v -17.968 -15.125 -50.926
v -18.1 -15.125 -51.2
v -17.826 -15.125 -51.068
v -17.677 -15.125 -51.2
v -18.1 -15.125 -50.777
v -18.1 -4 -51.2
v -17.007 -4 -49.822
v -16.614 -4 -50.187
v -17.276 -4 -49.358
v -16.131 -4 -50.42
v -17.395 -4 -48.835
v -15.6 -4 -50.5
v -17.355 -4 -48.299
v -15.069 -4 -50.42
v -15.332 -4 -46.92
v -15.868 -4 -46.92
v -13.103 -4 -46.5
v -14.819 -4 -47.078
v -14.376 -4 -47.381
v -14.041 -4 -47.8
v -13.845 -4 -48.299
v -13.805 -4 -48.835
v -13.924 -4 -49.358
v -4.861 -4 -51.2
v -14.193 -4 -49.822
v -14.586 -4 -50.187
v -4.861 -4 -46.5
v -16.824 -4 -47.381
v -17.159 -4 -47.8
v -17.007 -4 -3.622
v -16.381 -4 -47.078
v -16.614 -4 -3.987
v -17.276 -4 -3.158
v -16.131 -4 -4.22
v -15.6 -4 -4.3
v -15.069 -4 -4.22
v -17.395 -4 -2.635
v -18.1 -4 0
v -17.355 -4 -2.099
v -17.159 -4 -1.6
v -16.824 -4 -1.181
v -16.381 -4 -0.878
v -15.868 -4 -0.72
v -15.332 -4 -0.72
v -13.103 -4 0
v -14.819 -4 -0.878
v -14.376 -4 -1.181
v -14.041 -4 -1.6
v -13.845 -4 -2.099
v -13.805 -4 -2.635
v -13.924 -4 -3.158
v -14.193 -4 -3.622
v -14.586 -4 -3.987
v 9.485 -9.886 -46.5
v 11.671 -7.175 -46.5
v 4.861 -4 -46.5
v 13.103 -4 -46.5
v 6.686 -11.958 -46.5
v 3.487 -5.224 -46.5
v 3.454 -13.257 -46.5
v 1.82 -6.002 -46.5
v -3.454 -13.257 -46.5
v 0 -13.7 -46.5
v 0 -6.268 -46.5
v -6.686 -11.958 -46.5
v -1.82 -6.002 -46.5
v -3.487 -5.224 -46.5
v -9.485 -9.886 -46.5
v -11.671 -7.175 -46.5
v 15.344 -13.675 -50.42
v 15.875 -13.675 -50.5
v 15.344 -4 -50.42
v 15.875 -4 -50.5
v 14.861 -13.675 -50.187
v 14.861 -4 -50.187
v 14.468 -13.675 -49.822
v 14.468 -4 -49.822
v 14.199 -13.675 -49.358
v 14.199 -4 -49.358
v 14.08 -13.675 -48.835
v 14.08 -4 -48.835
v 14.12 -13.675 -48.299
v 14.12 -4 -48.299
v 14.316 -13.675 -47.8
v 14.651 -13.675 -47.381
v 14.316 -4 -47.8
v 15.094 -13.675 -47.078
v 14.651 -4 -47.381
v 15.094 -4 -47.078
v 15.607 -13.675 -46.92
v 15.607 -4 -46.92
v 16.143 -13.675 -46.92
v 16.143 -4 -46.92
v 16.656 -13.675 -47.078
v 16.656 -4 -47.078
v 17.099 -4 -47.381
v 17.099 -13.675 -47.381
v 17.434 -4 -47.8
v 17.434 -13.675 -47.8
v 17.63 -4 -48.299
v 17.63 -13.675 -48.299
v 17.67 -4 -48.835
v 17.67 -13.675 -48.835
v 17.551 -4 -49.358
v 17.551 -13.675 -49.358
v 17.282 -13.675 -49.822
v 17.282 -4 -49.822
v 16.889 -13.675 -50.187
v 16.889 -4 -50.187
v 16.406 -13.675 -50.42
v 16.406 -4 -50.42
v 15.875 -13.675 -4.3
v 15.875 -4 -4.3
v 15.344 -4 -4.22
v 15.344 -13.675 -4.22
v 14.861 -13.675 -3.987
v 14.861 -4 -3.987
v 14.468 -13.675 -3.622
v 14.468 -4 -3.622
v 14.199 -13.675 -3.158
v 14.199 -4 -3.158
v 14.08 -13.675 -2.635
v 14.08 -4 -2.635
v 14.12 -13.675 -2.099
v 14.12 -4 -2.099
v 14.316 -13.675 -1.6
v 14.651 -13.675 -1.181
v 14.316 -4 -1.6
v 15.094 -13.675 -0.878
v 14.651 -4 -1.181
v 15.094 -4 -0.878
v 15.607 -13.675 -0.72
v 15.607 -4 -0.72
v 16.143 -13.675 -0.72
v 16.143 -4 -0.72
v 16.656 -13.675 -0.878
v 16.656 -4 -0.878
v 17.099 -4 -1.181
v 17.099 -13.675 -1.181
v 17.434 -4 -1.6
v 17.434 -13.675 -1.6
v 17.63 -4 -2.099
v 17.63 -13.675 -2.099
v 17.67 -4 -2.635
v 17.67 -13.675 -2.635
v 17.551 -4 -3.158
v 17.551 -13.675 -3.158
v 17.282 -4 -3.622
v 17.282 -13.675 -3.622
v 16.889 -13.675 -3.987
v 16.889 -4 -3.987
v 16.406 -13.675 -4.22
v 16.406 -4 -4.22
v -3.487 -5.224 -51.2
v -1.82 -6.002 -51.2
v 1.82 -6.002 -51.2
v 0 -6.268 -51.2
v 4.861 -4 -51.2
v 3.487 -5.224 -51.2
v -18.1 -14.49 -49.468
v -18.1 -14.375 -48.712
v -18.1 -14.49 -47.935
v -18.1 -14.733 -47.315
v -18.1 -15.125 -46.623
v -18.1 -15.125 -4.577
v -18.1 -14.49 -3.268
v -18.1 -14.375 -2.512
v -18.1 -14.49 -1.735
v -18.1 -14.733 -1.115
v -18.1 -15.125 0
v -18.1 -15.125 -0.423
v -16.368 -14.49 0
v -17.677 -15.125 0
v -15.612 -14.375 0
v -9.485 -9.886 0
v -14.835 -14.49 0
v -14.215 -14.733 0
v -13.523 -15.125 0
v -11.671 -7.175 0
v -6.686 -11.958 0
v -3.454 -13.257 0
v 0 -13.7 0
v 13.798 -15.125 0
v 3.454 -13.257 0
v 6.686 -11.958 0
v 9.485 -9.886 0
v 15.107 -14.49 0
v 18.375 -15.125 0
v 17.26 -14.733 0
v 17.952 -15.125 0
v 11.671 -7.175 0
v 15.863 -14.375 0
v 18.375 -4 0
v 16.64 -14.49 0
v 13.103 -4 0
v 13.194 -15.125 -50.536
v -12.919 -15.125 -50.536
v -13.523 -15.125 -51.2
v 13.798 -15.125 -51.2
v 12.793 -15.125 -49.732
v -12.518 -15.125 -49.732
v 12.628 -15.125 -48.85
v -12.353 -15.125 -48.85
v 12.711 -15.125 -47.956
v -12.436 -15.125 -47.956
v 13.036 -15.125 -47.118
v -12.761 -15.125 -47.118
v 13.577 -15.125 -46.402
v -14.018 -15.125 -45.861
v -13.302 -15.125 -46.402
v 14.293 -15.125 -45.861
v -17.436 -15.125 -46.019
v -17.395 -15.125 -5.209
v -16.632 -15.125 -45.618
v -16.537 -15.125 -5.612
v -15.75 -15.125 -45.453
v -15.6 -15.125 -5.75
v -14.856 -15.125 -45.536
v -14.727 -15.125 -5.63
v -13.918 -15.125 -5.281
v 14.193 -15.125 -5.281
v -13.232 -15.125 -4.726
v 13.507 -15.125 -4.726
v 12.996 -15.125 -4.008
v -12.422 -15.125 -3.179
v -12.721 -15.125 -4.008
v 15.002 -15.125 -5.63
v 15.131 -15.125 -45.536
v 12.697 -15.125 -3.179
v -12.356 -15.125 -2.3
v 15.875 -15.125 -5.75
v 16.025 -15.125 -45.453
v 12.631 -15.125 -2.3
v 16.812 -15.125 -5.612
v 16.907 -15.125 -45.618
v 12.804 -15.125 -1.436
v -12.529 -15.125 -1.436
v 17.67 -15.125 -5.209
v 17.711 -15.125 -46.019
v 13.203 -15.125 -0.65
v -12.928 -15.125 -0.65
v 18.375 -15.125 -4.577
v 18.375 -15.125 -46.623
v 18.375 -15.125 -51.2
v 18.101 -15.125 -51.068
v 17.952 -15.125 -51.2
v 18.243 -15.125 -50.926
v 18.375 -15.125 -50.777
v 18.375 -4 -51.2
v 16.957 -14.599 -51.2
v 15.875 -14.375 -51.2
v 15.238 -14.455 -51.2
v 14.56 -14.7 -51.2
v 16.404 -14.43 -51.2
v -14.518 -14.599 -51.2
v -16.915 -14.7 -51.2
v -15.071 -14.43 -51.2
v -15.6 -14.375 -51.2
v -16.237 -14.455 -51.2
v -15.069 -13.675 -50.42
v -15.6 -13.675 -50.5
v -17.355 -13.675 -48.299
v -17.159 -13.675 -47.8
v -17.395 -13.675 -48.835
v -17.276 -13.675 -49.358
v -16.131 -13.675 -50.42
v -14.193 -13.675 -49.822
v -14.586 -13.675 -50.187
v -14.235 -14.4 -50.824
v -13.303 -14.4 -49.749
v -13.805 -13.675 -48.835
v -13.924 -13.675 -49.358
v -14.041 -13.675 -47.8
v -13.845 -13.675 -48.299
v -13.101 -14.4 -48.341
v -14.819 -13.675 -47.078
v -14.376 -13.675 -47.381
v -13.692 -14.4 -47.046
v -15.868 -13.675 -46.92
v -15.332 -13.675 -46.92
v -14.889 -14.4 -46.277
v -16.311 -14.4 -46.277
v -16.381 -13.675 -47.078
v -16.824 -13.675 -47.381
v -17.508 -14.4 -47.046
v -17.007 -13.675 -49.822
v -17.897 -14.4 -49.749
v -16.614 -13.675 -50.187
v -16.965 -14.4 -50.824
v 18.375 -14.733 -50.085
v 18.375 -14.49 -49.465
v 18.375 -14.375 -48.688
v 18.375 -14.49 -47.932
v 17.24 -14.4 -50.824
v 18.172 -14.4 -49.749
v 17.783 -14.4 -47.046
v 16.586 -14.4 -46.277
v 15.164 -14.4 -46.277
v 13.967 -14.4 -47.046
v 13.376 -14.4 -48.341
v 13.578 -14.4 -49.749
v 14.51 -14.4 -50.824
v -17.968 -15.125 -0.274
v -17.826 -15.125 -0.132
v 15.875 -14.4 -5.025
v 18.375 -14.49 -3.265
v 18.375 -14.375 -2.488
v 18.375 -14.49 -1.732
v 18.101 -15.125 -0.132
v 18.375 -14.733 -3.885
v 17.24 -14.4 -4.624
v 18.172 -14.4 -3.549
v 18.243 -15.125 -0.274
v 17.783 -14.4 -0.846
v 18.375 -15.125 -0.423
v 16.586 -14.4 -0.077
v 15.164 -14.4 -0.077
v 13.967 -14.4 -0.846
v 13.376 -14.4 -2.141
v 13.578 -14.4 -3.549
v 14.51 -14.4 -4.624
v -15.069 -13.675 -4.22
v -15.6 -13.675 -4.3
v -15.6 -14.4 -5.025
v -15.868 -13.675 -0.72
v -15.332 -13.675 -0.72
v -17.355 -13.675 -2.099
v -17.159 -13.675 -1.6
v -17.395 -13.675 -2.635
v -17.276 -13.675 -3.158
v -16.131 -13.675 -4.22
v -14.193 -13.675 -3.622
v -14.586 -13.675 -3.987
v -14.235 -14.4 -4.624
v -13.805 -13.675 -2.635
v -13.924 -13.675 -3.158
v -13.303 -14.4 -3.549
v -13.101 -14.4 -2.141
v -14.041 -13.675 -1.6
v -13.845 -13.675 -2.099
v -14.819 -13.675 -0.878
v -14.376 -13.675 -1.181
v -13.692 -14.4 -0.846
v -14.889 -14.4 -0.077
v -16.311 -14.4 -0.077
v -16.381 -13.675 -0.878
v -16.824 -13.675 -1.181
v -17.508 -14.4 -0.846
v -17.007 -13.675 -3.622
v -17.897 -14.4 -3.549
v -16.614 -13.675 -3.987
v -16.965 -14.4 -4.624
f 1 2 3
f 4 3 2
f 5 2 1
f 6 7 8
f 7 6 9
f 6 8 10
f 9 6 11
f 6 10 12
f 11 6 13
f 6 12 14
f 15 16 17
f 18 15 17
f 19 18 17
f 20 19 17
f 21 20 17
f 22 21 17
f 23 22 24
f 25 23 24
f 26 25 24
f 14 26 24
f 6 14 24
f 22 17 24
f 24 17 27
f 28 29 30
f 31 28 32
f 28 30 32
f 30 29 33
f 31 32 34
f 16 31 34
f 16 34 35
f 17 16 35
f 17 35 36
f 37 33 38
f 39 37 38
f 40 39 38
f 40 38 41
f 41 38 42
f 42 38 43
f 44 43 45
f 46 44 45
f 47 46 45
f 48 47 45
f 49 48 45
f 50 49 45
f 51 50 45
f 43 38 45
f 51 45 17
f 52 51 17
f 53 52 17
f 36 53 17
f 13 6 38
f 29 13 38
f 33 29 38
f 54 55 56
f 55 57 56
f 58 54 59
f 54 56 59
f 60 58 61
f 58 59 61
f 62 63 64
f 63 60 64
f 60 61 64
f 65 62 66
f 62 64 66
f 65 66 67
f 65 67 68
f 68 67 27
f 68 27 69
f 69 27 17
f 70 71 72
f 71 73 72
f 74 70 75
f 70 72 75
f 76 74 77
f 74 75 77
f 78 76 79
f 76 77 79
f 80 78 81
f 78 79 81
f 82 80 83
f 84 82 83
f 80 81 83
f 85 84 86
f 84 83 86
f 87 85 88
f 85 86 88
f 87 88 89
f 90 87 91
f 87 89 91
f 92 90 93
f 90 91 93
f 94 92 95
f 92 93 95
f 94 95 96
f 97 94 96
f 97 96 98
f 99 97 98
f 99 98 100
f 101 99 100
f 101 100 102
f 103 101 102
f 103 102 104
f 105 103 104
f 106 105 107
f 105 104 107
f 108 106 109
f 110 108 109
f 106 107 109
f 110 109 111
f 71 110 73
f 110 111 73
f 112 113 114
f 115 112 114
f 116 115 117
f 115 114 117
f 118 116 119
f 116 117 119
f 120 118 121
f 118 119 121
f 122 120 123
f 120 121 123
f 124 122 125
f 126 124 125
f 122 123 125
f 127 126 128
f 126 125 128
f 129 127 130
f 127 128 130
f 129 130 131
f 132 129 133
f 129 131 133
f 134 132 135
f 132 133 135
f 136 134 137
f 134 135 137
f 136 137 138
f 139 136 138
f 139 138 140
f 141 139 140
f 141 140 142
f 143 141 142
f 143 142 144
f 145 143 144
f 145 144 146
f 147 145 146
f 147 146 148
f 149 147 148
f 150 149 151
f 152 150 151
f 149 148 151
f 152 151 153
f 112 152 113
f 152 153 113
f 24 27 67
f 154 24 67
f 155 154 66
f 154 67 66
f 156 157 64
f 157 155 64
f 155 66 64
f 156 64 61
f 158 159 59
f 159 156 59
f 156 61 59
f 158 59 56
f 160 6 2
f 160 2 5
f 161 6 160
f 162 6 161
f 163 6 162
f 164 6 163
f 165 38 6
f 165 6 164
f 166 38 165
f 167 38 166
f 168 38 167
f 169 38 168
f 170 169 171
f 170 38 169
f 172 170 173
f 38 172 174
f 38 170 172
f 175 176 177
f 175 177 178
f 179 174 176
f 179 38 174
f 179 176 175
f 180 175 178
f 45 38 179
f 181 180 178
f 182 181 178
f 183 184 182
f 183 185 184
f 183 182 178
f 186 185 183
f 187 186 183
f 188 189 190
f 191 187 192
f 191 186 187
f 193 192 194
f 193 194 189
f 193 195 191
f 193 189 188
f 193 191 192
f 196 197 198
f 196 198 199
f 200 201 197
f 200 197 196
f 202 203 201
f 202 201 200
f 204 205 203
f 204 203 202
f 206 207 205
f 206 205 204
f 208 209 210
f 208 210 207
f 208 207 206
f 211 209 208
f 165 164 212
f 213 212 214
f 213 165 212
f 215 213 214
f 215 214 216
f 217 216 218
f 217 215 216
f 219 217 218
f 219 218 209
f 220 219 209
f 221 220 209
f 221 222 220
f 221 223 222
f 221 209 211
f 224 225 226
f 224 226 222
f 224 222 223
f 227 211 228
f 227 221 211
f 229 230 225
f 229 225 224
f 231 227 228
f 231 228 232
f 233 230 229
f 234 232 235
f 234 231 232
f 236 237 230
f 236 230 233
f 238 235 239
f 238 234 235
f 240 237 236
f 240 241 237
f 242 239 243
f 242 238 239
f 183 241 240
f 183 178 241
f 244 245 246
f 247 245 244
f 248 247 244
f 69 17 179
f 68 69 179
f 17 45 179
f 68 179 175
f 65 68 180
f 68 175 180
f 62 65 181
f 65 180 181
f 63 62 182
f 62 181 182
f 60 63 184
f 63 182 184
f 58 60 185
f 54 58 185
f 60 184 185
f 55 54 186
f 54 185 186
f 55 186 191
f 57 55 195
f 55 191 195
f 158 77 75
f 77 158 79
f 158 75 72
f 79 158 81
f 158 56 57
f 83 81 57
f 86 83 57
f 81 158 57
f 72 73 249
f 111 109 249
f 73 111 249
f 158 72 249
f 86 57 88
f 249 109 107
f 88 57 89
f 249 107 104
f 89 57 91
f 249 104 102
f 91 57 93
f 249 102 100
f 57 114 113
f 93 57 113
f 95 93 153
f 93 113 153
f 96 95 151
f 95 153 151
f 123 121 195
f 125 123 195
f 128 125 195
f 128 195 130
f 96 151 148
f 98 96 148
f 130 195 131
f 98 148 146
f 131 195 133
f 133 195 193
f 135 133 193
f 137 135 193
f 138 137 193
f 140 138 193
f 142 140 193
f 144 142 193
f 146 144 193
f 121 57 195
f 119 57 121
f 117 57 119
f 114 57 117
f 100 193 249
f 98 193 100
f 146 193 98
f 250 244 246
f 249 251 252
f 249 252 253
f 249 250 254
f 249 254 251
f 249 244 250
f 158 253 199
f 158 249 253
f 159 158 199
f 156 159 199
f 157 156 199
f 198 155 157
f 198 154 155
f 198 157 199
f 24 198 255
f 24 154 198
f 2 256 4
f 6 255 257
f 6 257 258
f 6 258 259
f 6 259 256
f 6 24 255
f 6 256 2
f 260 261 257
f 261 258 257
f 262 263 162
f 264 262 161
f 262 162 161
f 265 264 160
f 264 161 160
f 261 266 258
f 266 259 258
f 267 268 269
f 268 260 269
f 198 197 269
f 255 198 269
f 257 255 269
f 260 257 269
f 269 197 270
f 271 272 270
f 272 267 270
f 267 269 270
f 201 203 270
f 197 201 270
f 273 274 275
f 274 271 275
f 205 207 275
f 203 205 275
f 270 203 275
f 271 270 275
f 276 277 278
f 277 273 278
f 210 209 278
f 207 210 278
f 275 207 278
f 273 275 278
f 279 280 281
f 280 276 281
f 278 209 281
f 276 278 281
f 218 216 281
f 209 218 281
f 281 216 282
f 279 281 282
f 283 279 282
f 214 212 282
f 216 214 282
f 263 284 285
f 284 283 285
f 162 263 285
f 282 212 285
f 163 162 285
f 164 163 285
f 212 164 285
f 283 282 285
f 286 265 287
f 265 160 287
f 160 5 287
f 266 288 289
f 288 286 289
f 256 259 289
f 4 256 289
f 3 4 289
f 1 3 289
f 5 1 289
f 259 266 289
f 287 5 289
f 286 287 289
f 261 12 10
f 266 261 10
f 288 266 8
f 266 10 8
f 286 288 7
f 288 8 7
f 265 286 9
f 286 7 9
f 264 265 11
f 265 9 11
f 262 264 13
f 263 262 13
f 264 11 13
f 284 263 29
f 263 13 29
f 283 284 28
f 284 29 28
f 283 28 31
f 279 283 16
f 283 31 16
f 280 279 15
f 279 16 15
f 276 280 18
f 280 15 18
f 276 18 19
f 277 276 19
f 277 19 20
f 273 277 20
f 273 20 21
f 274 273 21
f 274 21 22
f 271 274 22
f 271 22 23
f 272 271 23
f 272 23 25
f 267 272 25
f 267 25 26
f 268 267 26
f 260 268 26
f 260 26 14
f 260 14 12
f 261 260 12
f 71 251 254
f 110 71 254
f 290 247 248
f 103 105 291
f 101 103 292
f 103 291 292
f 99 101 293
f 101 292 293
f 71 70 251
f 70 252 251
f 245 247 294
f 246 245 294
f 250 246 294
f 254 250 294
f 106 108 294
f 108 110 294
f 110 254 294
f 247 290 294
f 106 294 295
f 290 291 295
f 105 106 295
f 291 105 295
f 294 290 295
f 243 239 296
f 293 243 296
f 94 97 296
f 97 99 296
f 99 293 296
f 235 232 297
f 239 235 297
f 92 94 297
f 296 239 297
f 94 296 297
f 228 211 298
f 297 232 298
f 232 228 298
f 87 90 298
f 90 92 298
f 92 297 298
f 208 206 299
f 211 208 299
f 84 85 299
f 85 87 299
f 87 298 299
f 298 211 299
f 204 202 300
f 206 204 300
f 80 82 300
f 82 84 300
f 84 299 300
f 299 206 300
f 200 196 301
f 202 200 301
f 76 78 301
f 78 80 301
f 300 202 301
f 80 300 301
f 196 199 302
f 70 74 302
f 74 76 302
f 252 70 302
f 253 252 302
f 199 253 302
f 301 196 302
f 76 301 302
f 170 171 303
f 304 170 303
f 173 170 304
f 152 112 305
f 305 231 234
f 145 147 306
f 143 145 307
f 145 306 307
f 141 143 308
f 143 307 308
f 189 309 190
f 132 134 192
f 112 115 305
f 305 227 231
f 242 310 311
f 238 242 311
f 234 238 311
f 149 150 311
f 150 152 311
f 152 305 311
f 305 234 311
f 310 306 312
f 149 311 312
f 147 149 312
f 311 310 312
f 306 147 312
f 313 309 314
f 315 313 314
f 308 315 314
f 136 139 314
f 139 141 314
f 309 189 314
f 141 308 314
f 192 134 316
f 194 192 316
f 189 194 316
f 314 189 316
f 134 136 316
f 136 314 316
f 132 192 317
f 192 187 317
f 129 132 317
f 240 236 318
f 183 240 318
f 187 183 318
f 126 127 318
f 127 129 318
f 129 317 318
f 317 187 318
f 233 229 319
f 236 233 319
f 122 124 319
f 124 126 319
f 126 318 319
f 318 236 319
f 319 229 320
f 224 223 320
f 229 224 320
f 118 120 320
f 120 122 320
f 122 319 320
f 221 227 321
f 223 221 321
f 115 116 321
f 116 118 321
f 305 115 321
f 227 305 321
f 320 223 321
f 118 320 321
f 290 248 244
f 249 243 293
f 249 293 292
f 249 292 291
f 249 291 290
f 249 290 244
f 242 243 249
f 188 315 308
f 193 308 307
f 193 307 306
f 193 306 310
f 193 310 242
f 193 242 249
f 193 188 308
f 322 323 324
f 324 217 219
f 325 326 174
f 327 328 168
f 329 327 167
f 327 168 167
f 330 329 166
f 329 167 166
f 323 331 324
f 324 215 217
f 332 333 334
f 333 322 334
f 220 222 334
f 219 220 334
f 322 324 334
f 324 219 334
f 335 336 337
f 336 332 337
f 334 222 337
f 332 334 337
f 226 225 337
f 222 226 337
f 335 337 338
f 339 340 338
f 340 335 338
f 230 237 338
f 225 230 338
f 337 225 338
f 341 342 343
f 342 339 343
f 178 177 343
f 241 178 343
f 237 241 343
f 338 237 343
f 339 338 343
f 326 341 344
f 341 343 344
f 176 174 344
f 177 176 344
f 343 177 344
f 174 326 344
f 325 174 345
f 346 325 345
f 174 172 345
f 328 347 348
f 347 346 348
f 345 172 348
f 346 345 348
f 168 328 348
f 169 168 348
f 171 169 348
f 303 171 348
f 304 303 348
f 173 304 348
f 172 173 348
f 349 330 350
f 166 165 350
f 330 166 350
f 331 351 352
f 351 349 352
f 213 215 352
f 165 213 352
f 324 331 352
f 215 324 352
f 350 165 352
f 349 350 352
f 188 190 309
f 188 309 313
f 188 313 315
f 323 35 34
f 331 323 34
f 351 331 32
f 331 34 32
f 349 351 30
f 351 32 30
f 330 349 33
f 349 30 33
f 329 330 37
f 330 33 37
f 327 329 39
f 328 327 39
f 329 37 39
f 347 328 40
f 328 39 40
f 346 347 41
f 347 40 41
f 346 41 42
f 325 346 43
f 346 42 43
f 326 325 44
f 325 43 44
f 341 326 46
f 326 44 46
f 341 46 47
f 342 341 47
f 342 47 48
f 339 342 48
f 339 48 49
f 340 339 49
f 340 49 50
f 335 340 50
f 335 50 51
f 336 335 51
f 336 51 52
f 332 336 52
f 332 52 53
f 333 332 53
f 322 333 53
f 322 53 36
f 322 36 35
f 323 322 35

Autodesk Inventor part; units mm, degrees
ref_plane "YZ Plane" through (0, 0, 0) normal (1, 0, 0) x (0, 1, 0)
sketch "Sketch1" plane through (0, 0, 0) normal (0, 0, 1) x (1, 0, 0)
  circle A0 centre (0, 0) radius 13.7 projected
  line L0 (18.375, 15.375) -> (-18.1, 15.375) projected
  line L1 (-18.1, 15.375) -> (-18.1, -4) projected
  line L2 (-18.1, -4) -> (-13.1031, -4) projected
  arc A1 (13.1031, -4) -> (-13.1031, -4) centre (0, 0) ccw projected
  line L3 (13.1031, -4) -> (18.375, -4) projected
  line L4 (18.375, -4) -> (18.375, 15.375) projected
  line L5 (18.375, -4) -> (-18.1, -4)
  line L6 (-18.1, -4) -> (-18.1, -15.125)
  line L7 (-18.1, -15.125) -> (18.375, -15.125)
  line L8 (18.375, -15.125) -> (18.375, -4)
  circle A2 centre (44.375, 8.875) radius 25 projected
  point P0 (0, -13.7)
  point P1 (44.375, -16.125)
  dimension "d2" = 29.075
  dimension "d15" = 1
ref_plane "Work Plane1" through (-13.7, -13.7, -46.5) normal (0, 0, -1) x (0, 1, 0)
extrude "Extrusion1" add sketch "Sketch1" against normal up to surface (46.5 mm away) contours A0 L3 L8 L7 L6 L2
sketch "Sketch2" plane through (18.375, -15.125, -46.5) normal (0, 0, -1) x (-1, 0, 0)
  circle A0 centre (26.375, 15.2) radius 1.0564 projected
  circle A1 centre (10.375, 15.2) radius 1.0564 projected
  circle A2 centre (18.375, 15.2) radius 5 projected
  circle A3 centre (18.375, 15.2) radius 13.7 projected
  arc A4 (23.2981, 11.2) -> (13.4519, 11.2) centre (18.375, 15.2) ccw projected
  circle A5 centre (18.375, 15.2) radius 6.3433
  line L0 (36.475, 0) -> (0, 0) projected
  line L1 (0, 11.125) -> (5.2719, 11.125) projected
  line L2 (36.475, 0) -> (0, 0)
  line L3 (0, 0) -> (0, 11.125)
  line L4 (0, 11.125) -> (36.475, 11.125)
  line L5 (36.475, 11.125) -> (36.475, 0)
  point P0 (18.375, 15.125)
  point P1 (23.2362, 11.125)
  point P2 (13.5138, 11.125)
ref_plane "Work Plane2" through (-18.1, -4, -51.2) normal (0, 0, -1) x (0, 1, 0)
extrude "Extrusion2" add sketch "Sketch2" along normal up to surface (4.7 mm away) contours A5 L4 A3 | A3 L4 L5 L0 L3 L1
sketch "Sketch3" plane through (-18.1, -15.125, 0) normal (0, -1, 0) x (1, 0, 0)
  circle A0 centre (33.975, -2.5) radius 1.8 projected
  circle A1 centre (33.975, -48.7) radius 1.8 projected
  circle A2 centre (2.5, -48.7) radius 1.8 projected
  circle A3 centre (2.5, -2.5) radius 1.8 projected
  point P0 (18.1, 0)
hole "Hole1" at (15.875, -15.125, -2.5) at (15.875, -15.125, -48.7) at (-15.6, -15.125, -48.7) at (-15.6, -15.125, -2.5) direction (0, 1, 0) diameter 3.6 end through all countersink diameter 6.5 countersink angle 90 clearance for "Countersunk Flat Head Screw ISO 2009/7046" size "M3" standard "ISO"
properties part number "right_motor_mount_ceil"
